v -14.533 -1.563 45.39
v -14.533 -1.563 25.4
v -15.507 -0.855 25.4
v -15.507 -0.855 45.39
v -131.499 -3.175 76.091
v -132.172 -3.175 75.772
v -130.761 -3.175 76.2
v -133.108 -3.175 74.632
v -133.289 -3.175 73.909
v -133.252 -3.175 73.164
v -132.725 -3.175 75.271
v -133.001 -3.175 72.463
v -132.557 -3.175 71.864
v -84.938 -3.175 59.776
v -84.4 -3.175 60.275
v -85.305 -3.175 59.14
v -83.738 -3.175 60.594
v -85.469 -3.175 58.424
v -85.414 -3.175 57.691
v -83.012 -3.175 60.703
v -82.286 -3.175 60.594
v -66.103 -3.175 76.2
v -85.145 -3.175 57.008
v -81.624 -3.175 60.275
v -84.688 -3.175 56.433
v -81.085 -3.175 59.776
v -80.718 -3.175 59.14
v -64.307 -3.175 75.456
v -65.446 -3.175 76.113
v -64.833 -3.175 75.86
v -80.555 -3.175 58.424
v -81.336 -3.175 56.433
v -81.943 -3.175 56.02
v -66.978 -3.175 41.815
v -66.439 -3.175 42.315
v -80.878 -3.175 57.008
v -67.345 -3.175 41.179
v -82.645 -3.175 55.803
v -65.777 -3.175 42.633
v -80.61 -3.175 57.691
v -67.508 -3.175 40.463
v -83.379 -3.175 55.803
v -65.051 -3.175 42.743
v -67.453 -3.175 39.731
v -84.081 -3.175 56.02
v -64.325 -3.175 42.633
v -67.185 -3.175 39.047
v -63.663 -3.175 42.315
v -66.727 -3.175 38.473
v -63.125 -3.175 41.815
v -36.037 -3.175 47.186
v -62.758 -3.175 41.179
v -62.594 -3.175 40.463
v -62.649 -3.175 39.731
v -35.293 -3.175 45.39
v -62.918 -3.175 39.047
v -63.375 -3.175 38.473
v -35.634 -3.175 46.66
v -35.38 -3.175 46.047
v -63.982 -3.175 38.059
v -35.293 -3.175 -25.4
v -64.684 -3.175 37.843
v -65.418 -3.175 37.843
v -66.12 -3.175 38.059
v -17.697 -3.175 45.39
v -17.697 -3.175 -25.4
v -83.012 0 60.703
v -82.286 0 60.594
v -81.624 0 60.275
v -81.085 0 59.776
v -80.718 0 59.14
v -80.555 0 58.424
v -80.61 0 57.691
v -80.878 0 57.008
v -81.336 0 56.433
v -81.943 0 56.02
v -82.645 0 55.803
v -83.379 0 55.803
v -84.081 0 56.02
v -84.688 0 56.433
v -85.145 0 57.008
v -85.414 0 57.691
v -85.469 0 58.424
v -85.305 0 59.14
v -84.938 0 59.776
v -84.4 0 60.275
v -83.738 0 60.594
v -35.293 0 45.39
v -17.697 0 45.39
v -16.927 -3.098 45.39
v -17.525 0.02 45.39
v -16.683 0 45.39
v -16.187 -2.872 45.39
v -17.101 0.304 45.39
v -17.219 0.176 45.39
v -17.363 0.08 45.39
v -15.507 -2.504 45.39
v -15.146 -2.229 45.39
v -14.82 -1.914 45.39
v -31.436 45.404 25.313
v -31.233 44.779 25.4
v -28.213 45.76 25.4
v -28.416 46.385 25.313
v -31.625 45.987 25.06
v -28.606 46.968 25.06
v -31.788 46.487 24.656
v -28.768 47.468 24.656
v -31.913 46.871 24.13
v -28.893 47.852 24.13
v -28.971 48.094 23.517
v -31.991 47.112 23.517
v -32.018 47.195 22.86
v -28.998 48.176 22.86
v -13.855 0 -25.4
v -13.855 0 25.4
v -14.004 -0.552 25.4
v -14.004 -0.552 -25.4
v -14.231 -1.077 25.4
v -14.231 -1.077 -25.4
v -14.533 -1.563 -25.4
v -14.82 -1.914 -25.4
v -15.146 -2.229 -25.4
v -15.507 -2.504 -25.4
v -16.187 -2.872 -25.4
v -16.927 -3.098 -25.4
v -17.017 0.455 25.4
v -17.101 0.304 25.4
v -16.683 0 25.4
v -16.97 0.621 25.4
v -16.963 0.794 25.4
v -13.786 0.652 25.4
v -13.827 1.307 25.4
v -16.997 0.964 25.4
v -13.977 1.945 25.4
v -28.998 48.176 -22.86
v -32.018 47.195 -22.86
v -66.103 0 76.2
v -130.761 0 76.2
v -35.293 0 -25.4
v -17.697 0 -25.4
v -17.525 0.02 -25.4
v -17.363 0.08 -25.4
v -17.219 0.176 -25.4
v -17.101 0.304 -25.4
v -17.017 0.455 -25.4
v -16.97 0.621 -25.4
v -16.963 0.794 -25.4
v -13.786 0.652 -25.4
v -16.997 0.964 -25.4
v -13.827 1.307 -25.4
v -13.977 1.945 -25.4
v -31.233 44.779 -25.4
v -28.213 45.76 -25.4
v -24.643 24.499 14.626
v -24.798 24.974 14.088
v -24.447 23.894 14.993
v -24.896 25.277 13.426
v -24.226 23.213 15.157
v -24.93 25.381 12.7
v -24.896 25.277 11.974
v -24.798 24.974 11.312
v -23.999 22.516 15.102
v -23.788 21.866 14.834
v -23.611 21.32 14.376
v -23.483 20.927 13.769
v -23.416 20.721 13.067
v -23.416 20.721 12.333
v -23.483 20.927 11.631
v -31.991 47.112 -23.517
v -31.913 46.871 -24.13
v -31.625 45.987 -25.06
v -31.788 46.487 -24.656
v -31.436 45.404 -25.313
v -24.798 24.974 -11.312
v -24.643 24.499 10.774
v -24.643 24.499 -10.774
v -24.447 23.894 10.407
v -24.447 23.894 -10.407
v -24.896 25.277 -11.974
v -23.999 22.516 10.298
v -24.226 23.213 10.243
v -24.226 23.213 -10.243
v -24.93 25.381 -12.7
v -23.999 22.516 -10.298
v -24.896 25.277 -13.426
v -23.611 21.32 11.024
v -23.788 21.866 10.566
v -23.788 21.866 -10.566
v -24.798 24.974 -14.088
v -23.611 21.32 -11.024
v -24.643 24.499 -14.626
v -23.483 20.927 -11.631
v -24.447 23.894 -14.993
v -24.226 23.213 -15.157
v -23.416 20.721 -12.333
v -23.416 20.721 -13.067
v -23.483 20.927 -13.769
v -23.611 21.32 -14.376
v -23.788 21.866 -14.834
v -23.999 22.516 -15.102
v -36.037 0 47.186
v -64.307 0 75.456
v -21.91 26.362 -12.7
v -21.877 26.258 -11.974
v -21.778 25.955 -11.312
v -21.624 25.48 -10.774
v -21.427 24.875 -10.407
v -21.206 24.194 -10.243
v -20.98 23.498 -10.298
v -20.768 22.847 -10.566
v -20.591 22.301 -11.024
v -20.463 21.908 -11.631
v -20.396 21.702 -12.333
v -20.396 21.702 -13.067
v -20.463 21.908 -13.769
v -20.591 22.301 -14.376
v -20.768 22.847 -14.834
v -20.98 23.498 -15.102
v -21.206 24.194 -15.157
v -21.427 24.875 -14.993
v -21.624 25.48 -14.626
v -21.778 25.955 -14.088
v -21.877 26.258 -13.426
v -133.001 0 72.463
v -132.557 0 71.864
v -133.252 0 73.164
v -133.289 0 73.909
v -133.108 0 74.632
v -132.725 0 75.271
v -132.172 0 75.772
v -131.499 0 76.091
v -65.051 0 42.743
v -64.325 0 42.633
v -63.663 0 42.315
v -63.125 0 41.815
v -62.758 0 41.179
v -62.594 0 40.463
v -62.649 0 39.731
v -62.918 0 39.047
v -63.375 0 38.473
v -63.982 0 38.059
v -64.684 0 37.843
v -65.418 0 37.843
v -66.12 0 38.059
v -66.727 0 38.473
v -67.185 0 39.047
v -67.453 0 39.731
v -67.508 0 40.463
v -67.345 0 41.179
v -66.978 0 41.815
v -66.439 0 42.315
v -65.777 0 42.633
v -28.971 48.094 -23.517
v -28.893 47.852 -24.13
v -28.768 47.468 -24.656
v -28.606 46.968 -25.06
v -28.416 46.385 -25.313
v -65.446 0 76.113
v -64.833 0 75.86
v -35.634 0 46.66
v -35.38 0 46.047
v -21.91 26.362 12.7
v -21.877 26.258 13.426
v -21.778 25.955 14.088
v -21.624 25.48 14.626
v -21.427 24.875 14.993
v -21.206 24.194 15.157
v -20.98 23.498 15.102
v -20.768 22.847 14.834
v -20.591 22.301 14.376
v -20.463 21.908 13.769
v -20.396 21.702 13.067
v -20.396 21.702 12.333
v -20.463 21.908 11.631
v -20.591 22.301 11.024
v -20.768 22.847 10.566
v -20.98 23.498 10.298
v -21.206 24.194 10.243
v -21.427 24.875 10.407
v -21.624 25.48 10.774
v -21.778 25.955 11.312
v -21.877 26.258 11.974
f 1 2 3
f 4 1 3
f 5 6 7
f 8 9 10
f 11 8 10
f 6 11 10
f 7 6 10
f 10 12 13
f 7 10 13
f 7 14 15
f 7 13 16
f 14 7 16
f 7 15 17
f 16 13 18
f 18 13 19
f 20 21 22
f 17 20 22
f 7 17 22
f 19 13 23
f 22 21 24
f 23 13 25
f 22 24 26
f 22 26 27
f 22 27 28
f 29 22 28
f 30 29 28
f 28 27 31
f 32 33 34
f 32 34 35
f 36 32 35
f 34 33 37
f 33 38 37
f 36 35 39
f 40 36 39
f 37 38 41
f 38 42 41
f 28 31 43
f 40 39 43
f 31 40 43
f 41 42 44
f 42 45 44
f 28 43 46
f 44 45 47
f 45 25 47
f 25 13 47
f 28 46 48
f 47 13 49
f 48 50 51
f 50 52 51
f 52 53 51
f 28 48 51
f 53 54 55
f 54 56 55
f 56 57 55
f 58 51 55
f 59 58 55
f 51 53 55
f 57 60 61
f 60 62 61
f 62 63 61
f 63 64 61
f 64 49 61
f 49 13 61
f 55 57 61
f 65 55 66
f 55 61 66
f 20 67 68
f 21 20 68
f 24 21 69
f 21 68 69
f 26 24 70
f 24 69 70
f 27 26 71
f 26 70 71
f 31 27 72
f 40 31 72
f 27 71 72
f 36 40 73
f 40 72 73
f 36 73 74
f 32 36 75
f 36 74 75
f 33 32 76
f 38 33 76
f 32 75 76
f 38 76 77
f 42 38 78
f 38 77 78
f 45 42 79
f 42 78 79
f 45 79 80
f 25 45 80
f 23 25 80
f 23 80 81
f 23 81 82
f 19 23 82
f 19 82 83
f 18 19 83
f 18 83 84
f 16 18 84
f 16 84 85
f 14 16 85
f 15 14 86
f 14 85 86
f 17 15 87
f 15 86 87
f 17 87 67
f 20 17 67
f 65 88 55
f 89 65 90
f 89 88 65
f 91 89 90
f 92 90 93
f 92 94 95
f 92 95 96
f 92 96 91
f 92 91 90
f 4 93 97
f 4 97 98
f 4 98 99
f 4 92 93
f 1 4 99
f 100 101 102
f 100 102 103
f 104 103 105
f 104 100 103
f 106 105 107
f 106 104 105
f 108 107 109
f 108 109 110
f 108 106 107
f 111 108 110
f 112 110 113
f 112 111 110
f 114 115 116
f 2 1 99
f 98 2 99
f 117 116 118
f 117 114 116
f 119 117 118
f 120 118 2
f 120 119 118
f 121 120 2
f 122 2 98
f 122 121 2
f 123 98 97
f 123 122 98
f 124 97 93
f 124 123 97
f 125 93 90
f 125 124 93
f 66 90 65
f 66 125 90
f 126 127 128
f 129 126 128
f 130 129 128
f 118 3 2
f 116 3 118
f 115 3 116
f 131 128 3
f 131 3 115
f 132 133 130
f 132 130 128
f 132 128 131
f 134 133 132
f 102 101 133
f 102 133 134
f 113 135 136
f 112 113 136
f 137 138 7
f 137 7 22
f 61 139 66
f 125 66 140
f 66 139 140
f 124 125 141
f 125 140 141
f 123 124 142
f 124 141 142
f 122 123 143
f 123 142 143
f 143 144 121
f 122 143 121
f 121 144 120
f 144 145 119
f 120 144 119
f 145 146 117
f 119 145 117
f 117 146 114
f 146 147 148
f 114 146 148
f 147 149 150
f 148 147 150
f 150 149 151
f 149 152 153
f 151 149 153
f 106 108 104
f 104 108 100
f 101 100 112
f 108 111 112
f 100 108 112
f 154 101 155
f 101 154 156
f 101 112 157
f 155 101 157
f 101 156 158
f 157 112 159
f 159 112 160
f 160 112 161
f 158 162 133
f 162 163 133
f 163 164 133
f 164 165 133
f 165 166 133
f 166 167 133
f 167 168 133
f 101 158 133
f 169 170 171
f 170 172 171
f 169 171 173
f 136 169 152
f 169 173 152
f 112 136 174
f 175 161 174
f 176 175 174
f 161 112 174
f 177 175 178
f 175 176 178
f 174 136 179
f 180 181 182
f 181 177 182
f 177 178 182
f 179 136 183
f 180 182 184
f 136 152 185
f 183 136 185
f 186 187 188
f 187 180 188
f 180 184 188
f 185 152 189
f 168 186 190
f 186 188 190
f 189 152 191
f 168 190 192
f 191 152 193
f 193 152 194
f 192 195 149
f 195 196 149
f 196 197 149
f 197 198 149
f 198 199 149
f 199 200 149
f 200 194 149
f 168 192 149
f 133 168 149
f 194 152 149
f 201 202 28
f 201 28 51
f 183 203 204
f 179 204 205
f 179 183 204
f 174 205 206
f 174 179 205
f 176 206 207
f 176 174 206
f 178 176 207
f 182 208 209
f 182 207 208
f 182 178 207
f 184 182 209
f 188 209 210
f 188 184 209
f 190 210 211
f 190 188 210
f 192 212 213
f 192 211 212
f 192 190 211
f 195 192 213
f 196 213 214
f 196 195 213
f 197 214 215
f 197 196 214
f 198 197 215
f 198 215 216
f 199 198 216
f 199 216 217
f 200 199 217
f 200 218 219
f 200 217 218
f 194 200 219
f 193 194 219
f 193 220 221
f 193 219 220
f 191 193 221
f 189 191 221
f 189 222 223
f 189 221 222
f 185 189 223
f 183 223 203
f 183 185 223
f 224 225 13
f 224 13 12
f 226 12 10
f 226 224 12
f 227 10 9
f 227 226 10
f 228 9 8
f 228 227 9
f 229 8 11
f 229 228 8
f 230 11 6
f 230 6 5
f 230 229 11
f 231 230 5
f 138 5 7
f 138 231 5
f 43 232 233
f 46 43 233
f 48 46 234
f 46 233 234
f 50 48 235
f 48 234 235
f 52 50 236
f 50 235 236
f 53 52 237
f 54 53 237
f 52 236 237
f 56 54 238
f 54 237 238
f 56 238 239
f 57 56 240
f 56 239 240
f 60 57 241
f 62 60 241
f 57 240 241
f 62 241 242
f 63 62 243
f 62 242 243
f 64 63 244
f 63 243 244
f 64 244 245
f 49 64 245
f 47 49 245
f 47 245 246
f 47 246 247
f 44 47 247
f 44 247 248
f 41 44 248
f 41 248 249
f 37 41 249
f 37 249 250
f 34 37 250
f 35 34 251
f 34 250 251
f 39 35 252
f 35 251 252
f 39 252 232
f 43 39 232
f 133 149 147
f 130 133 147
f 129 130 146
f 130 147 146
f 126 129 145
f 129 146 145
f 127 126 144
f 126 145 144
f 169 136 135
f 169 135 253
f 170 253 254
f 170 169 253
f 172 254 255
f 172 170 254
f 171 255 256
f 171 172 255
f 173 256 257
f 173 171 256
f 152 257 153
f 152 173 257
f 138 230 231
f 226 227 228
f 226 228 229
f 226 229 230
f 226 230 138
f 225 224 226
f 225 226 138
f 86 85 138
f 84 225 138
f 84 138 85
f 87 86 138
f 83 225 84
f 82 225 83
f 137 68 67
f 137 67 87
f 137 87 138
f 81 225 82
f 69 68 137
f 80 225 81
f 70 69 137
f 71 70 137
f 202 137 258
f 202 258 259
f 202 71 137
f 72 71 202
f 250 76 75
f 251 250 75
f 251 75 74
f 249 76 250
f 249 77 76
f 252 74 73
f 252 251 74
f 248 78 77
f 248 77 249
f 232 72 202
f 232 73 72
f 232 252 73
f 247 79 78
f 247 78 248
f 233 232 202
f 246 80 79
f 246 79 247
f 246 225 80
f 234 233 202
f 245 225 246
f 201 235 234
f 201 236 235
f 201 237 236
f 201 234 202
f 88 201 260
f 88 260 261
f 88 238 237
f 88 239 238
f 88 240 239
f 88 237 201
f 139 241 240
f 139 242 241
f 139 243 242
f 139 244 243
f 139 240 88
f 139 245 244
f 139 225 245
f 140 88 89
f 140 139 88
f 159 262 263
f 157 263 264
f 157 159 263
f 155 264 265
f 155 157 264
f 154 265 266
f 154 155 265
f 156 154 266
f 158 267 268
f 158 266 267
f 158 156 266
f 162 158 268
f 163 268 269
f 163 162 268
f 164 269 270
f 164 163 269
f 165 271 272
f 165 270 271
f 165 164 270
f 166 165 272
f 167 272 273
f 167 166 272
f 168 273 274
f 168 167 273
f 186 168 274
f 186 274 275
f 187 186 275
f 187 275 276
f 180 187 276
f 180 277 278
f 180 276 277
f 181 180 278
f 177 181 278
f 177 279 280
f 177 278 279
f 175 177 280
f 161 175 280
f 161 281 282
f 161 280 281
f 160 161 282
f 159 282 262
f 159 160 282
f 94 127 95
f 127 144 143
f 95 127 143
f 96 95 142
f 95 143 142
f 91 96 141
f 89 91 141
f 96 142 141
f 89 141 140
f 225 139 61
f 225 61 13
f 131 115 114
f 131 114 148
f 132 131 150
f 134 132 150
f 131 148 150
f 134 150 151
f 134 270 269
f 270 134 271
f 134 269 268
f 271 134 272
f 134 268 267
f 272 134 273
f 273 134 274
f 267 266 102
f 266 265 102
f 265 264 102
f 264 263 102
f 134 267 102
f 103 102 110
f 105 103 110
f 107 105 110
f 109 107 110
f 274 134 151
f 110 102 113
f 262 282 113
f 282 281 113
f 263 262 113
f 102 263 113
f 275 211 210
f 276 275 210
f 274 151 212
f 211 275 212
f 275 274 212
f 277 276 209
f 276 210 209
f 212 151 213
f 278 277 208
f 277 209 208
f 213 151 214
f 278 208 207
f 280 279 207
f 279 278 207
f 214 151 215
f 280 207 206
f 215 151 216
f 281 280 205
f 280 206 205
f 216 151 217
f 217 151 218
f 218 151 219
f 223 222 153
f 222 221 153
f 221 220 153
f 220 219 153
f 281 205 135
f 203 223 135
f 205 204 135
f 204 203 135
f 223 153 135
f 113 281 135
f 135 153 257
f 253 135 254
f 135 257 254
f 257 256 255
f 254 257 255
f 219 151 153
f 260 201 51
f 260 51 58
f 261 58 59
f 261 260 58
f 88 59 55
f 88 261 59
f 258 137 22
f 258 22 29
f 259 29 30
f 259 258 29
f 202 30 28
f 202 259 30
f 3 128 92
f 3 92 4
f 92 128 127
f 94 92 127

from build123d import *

# Parameters (mm, degrees)
SKETCH1_R                  = 2.4638
BASE_FLANGE1_DEPTH         = 3.175
SKETCHED_START             = -25.4
SKETCHED_BEND1_DEPTH       = 70.78994652
SKETCHED_START_2           = 25.4
SKETCHED_BEND1_2_DEPTH     = 19.98994652
SKETCHED_START_3           = -10.2361999
SKETCHED_BEND1_3_DEPTH     = 20.4723998
SKETCHED_START_4           = -22.86
SKETCHED_BEND1_4_DEPTH     = 7.6961999
SKETCHED_START_5           = 15.1638001
SKETCHED_BEND1_5_DEPTH     = 7.6961999
SKETCHED_BEND1_6_DEPTH     = 70.78994652
SKETCHED_BEND1_7_DEPTH     = 50.8
SKETCHED_START_6           = -15.866732383
SKETCHED_BEND1_8_OUTLINE_R = 2.4638
SKETCHED_BEND1_8_DEPTH     = 3.866732383


with BuildPart() as part:
    # Base-Flange1: sheet metal written as solids
    # Sketch1 → Base-Flange1 (new body)
    with BuildSketch(Plane(origin=(0, 0, 0), x_dir=(1, 0, 0), z_dir=(0, 1, 0))):
        with BuildLine():
            Line((-35.2933, 25.4), (-132.557248776, -71.863948776))
            ThreePointArc((-132.557248776, -71.863948776), (-133.107851564, -74.632015918), (-130.761197552, -76.2))
            Line((-130.761197552, -76.2), (-66.10335348, -76.2))
            ThreePointArc((-66.10335348, -76.2), (-65.131337562, -76.006654013), (-64.307302256, -75.456051224))
            Line((-64.307302256, -75.456051224), (-36.037248776, -47.185997744))
            ThreePointArc((-36.037248776, -47.185997744), (-35.486645987, -46.361962438), (-35.2933, -45.38994652))
            Line((-35.2933, -45.38994652), (-15.5067, -45.38994652))
            Line((-15.5067, -45.38994652), (-15.5067, -25.4))
            Line((-15.5067, -25.4), (32.7533, -25.4))
            ThreePointArc((32.7533, -25.4), (34.549351224, -24.656051224), (35.2933, -22.86))
            Line((35.2933, -22.86), (35.2933, 22.86))
            ThreePointArc((35.2933, 22.86), (34.549351224, 24.656051224), (32.7533, 25.4))
            Line((32.7533, 25.4), (-35.2933, 25.4))
        make_face()
        with Locations(Location((-83.011763274, -58.239487758, 0), (0, 0, 270))):
            Circle(SKETCH1_R, mode=Mode.SUBTRACT)
        with Locations(Location((-65.051251031, -40.278975516, 0), (0, 0, 270))):
            Circle(SKETCH1_R, mode=Mode.SUBTRACT)
        with Locations(Location((9.8933, -12.7, 0), (0, 0, 270))):
            Circle(SKETCH1_R, mode=Mode.SUBTRACT)
        with Locations(Location((9.8933, 12.7, 0), (0, 0, 270))):
            Circle(SKETCH1_R, mode=Mode.SUBTRACT)
    extrude(amount=-BASE_FLANGE1_DEPTH)

    # Sketched Bend1: read off the stored shape, not the designer's step
    # Sketched Bend1 outline → Sketched Bend1 (cut)
    with BuildSketch(Plane.XY.offset(SKETCHED_START)):
        with BuildLine():
            Line((35.2933, 0), (-13.855493847, 0))
            ThreePointArc((-13.855493847, 0), (-15.205192704, -2.278520157), (-17.697112646, -3.175))
            Line((-17.697112646, -3.175), (35.2933, -3.175))
            Line((35.2933, -3.175), (35.2933, 0))
        make_face()
    extrude(amount=SKETCHED_BEND1_DEPTH, mode=Mode.SUBTRACT)

    # Sketched Bend1 2 outline → Sketched Bend1 2 (cut)
    with BuildSketch(Plane.XY.offset(SKETCHED_START_2)):
        Polygon((-15.5067, -0.854827941), (-15.5067, 0), (-16.683269724, 0), align=None)
    extrude(amount=SKETCHED_BEND1_2_DEPTH, mode=Mode.SUBTRACT)

    # Sketched Bend1 3 outline → Sketched Bend1 3 (add)
    with BuildSketch(Plane.XY.offset(SKETCHED_START_3)):
        with BuildLine():
            ThreePointArc((-13.855493847, 0), (-13.793115407, 0.98036242), (-13.976959977, 1.945350875))
            Line((-13.976959977, 1.945350875), (-28.998148559, 48.175815683))
            Line((-28.998148559, 48.175815683), (-32.017752998, 47.194686726))
            Line((-32.017752998, 47.194686726), (-16.996564416, 0.964221918))
            ThreePointArc((-16.996564416, 0.964221918), (-17.101190728, 0.303637383), (-17.697112646, 0))
            Line((-17.697112646, 0), (-13.855493847, 0))
        make_face()
    extrude(amount=SKETCHED_BEND1_3_DEPTH)

    # Sketched Bend1 4 outline → Sketched Bend1 4 (add)
    with BuildSketch(Plane.XY.offset(SKETCHED_START_4)):
        with BuildLine():
            ThreePointArc((-13.855493847, 0), (-13.793115407, 0.98036242), (-13.976959977, 1.945350875))
            Line((-13.976959977, 1.945350875), (-28.998148559, 48.175815683))
            Line((-28.998148559, 48.175815683), (-32.017752998, 47.194686726))
            Line((-32.017752998, 47.194686726), (-16.996564416, 0.964221918))
            ThreePointArc((-16.996564416, 0.964221918), (-17.101190728, 0.303637383), (-17.697112646, 0))
            Line((-17.697112646, 0), (-13.855493847, 0))
        make_face()
    extrude(amount=SKETCHED_BEND1_4_DEPTH)

    # Sketched Bend1 5 outline → Sketched Bend1 5 (add)
    with BuildSketch(Plane.XY.offset(SKETCHED_START_5)):
        with BuildLine():
            ThreePointArc((-13.855493847, 0), (-13.793115407, 0.98036242), (-13.976959977, 1.945350875))
            Line((-13.976959977, 1.945350875), (-28.998148559, 48.175815683))
            Line((-28.998148559, 48.175815683), (-32.017752998, 47.194686726))
            Line((-32.017752998, 47.194686726), (-16.996564416, 0.964221918))
            ThreePointArc((-16.996564416, 0.964221918), (-17.101190728, 0.303637383), (-17.697112646, 0))
            Line((-17.697112646, 0), (-13.855493847, 0))
        make_face()
    extrude(amount=SKETCHED_BEND1_5_DEPTH)

    # Sketched Bend1 6 outline → Sketched Bend1 6 (add)
    with BuildSketch(Plane.XY.offset(SKETCHED_START)):
        with BuildLine():
            ThreePointArc((-15.5067, -2.504188021), (-14.978553355, -2.0758811), (-14.532561771, -1.562580793))
            Line((-14.532561771, -1.562580793), (-15.5067, -0.854827941))
            Line((-15.5067, -0.854827941), (-15.5067, -2.504188021))
        make_face()
        with BuildLine():
            Line((-17.697112646, 0), (-16.683269724, 0))
            Line((-16.683269724, 0), (-17.101190728, 0.303637383))
            ThreePointArc((-17.101190728, 0.303637383), (-17.362703244, 0.080284594), (-17.697112646, 0))
        make_face()
    extrude(amount=SKETCHED_BEND1_6_DEPTH)

    # Sketched Bend1 7 outline → Sketched Bend1 7 (add)
    with BuildSketch(Plane.XY.offset(SKETCHED_START)):
        with BuildLine():
            ThreePointArc((-13.855493847, 0), (-13.793115407, 0.98036242), (-13.976959977, 1.945350875))
            Line((-13.976959977, 1.945350875), (-28.998148559, 48.175815683))
            Line((-28.998148559, 48.175815683), (-32.017752998, 47.194686726))
            Line((-32.017752998, 47.194686726), (-16.996564416, 0.964221918))
            ThreePointArc((-16.996564416, 0.964221918), (-16.969581414, 0.621370373), (-17.101190728, 0.303637383))
            Line((-17.101190728, 0.303637383), (-16.683269724, 0))
            Line((-16.683269724, 0), (-13.855493847, 0))
        make_face()
    extrude(amount=SKETCHED_BEND1_7_DEPTH)

    # Sketched Bend1 8 outline → Sketched Bend1 8 (cut)
    with BuildSketch(Plane(origin=(0, 0, 0), x_dir=(-0.30901699437495117, 0.9510565162951524, 0), z_dir=(0.9510565162951524, 0.3090169943749511, 0)).offset(SKETCHED_START_6)):
        with BuildLine():
            Line((54.778844143, -25.4), (54.778844143, -22.86))
            ThreePointArc((54.778844143, -22.86), (54.034895367, -24.656051224), (52.238844143, -25.4))
            Line((52.238844143, -25.4), (54.778844143, -25.4))
        make_face()
        with BuildLine():
            ThreePointArc((52.238844143, 25.4), (54.034895367, 24.656051224), (54.778844143, 22.86))
            Line((54.778844143, 22.86), (54.778844143, 25.4))
            Line((54.778844143, 25.4), (52.238844143, 25.4))
        make_face()
        with Locations((29.378844143, 12.7)):
            Circle(SKETCHED_BEND1_8_OUTLINE_R)
        with Locations((29.378844143, -12.7)):
            Circle(SKETCHED_BEND1_8_OUTLINE_R)
    extrude(amount=SKETCHED_BEND1_8_DEPTH, mode=Mode.SUBTRACT)


solid = part.part
